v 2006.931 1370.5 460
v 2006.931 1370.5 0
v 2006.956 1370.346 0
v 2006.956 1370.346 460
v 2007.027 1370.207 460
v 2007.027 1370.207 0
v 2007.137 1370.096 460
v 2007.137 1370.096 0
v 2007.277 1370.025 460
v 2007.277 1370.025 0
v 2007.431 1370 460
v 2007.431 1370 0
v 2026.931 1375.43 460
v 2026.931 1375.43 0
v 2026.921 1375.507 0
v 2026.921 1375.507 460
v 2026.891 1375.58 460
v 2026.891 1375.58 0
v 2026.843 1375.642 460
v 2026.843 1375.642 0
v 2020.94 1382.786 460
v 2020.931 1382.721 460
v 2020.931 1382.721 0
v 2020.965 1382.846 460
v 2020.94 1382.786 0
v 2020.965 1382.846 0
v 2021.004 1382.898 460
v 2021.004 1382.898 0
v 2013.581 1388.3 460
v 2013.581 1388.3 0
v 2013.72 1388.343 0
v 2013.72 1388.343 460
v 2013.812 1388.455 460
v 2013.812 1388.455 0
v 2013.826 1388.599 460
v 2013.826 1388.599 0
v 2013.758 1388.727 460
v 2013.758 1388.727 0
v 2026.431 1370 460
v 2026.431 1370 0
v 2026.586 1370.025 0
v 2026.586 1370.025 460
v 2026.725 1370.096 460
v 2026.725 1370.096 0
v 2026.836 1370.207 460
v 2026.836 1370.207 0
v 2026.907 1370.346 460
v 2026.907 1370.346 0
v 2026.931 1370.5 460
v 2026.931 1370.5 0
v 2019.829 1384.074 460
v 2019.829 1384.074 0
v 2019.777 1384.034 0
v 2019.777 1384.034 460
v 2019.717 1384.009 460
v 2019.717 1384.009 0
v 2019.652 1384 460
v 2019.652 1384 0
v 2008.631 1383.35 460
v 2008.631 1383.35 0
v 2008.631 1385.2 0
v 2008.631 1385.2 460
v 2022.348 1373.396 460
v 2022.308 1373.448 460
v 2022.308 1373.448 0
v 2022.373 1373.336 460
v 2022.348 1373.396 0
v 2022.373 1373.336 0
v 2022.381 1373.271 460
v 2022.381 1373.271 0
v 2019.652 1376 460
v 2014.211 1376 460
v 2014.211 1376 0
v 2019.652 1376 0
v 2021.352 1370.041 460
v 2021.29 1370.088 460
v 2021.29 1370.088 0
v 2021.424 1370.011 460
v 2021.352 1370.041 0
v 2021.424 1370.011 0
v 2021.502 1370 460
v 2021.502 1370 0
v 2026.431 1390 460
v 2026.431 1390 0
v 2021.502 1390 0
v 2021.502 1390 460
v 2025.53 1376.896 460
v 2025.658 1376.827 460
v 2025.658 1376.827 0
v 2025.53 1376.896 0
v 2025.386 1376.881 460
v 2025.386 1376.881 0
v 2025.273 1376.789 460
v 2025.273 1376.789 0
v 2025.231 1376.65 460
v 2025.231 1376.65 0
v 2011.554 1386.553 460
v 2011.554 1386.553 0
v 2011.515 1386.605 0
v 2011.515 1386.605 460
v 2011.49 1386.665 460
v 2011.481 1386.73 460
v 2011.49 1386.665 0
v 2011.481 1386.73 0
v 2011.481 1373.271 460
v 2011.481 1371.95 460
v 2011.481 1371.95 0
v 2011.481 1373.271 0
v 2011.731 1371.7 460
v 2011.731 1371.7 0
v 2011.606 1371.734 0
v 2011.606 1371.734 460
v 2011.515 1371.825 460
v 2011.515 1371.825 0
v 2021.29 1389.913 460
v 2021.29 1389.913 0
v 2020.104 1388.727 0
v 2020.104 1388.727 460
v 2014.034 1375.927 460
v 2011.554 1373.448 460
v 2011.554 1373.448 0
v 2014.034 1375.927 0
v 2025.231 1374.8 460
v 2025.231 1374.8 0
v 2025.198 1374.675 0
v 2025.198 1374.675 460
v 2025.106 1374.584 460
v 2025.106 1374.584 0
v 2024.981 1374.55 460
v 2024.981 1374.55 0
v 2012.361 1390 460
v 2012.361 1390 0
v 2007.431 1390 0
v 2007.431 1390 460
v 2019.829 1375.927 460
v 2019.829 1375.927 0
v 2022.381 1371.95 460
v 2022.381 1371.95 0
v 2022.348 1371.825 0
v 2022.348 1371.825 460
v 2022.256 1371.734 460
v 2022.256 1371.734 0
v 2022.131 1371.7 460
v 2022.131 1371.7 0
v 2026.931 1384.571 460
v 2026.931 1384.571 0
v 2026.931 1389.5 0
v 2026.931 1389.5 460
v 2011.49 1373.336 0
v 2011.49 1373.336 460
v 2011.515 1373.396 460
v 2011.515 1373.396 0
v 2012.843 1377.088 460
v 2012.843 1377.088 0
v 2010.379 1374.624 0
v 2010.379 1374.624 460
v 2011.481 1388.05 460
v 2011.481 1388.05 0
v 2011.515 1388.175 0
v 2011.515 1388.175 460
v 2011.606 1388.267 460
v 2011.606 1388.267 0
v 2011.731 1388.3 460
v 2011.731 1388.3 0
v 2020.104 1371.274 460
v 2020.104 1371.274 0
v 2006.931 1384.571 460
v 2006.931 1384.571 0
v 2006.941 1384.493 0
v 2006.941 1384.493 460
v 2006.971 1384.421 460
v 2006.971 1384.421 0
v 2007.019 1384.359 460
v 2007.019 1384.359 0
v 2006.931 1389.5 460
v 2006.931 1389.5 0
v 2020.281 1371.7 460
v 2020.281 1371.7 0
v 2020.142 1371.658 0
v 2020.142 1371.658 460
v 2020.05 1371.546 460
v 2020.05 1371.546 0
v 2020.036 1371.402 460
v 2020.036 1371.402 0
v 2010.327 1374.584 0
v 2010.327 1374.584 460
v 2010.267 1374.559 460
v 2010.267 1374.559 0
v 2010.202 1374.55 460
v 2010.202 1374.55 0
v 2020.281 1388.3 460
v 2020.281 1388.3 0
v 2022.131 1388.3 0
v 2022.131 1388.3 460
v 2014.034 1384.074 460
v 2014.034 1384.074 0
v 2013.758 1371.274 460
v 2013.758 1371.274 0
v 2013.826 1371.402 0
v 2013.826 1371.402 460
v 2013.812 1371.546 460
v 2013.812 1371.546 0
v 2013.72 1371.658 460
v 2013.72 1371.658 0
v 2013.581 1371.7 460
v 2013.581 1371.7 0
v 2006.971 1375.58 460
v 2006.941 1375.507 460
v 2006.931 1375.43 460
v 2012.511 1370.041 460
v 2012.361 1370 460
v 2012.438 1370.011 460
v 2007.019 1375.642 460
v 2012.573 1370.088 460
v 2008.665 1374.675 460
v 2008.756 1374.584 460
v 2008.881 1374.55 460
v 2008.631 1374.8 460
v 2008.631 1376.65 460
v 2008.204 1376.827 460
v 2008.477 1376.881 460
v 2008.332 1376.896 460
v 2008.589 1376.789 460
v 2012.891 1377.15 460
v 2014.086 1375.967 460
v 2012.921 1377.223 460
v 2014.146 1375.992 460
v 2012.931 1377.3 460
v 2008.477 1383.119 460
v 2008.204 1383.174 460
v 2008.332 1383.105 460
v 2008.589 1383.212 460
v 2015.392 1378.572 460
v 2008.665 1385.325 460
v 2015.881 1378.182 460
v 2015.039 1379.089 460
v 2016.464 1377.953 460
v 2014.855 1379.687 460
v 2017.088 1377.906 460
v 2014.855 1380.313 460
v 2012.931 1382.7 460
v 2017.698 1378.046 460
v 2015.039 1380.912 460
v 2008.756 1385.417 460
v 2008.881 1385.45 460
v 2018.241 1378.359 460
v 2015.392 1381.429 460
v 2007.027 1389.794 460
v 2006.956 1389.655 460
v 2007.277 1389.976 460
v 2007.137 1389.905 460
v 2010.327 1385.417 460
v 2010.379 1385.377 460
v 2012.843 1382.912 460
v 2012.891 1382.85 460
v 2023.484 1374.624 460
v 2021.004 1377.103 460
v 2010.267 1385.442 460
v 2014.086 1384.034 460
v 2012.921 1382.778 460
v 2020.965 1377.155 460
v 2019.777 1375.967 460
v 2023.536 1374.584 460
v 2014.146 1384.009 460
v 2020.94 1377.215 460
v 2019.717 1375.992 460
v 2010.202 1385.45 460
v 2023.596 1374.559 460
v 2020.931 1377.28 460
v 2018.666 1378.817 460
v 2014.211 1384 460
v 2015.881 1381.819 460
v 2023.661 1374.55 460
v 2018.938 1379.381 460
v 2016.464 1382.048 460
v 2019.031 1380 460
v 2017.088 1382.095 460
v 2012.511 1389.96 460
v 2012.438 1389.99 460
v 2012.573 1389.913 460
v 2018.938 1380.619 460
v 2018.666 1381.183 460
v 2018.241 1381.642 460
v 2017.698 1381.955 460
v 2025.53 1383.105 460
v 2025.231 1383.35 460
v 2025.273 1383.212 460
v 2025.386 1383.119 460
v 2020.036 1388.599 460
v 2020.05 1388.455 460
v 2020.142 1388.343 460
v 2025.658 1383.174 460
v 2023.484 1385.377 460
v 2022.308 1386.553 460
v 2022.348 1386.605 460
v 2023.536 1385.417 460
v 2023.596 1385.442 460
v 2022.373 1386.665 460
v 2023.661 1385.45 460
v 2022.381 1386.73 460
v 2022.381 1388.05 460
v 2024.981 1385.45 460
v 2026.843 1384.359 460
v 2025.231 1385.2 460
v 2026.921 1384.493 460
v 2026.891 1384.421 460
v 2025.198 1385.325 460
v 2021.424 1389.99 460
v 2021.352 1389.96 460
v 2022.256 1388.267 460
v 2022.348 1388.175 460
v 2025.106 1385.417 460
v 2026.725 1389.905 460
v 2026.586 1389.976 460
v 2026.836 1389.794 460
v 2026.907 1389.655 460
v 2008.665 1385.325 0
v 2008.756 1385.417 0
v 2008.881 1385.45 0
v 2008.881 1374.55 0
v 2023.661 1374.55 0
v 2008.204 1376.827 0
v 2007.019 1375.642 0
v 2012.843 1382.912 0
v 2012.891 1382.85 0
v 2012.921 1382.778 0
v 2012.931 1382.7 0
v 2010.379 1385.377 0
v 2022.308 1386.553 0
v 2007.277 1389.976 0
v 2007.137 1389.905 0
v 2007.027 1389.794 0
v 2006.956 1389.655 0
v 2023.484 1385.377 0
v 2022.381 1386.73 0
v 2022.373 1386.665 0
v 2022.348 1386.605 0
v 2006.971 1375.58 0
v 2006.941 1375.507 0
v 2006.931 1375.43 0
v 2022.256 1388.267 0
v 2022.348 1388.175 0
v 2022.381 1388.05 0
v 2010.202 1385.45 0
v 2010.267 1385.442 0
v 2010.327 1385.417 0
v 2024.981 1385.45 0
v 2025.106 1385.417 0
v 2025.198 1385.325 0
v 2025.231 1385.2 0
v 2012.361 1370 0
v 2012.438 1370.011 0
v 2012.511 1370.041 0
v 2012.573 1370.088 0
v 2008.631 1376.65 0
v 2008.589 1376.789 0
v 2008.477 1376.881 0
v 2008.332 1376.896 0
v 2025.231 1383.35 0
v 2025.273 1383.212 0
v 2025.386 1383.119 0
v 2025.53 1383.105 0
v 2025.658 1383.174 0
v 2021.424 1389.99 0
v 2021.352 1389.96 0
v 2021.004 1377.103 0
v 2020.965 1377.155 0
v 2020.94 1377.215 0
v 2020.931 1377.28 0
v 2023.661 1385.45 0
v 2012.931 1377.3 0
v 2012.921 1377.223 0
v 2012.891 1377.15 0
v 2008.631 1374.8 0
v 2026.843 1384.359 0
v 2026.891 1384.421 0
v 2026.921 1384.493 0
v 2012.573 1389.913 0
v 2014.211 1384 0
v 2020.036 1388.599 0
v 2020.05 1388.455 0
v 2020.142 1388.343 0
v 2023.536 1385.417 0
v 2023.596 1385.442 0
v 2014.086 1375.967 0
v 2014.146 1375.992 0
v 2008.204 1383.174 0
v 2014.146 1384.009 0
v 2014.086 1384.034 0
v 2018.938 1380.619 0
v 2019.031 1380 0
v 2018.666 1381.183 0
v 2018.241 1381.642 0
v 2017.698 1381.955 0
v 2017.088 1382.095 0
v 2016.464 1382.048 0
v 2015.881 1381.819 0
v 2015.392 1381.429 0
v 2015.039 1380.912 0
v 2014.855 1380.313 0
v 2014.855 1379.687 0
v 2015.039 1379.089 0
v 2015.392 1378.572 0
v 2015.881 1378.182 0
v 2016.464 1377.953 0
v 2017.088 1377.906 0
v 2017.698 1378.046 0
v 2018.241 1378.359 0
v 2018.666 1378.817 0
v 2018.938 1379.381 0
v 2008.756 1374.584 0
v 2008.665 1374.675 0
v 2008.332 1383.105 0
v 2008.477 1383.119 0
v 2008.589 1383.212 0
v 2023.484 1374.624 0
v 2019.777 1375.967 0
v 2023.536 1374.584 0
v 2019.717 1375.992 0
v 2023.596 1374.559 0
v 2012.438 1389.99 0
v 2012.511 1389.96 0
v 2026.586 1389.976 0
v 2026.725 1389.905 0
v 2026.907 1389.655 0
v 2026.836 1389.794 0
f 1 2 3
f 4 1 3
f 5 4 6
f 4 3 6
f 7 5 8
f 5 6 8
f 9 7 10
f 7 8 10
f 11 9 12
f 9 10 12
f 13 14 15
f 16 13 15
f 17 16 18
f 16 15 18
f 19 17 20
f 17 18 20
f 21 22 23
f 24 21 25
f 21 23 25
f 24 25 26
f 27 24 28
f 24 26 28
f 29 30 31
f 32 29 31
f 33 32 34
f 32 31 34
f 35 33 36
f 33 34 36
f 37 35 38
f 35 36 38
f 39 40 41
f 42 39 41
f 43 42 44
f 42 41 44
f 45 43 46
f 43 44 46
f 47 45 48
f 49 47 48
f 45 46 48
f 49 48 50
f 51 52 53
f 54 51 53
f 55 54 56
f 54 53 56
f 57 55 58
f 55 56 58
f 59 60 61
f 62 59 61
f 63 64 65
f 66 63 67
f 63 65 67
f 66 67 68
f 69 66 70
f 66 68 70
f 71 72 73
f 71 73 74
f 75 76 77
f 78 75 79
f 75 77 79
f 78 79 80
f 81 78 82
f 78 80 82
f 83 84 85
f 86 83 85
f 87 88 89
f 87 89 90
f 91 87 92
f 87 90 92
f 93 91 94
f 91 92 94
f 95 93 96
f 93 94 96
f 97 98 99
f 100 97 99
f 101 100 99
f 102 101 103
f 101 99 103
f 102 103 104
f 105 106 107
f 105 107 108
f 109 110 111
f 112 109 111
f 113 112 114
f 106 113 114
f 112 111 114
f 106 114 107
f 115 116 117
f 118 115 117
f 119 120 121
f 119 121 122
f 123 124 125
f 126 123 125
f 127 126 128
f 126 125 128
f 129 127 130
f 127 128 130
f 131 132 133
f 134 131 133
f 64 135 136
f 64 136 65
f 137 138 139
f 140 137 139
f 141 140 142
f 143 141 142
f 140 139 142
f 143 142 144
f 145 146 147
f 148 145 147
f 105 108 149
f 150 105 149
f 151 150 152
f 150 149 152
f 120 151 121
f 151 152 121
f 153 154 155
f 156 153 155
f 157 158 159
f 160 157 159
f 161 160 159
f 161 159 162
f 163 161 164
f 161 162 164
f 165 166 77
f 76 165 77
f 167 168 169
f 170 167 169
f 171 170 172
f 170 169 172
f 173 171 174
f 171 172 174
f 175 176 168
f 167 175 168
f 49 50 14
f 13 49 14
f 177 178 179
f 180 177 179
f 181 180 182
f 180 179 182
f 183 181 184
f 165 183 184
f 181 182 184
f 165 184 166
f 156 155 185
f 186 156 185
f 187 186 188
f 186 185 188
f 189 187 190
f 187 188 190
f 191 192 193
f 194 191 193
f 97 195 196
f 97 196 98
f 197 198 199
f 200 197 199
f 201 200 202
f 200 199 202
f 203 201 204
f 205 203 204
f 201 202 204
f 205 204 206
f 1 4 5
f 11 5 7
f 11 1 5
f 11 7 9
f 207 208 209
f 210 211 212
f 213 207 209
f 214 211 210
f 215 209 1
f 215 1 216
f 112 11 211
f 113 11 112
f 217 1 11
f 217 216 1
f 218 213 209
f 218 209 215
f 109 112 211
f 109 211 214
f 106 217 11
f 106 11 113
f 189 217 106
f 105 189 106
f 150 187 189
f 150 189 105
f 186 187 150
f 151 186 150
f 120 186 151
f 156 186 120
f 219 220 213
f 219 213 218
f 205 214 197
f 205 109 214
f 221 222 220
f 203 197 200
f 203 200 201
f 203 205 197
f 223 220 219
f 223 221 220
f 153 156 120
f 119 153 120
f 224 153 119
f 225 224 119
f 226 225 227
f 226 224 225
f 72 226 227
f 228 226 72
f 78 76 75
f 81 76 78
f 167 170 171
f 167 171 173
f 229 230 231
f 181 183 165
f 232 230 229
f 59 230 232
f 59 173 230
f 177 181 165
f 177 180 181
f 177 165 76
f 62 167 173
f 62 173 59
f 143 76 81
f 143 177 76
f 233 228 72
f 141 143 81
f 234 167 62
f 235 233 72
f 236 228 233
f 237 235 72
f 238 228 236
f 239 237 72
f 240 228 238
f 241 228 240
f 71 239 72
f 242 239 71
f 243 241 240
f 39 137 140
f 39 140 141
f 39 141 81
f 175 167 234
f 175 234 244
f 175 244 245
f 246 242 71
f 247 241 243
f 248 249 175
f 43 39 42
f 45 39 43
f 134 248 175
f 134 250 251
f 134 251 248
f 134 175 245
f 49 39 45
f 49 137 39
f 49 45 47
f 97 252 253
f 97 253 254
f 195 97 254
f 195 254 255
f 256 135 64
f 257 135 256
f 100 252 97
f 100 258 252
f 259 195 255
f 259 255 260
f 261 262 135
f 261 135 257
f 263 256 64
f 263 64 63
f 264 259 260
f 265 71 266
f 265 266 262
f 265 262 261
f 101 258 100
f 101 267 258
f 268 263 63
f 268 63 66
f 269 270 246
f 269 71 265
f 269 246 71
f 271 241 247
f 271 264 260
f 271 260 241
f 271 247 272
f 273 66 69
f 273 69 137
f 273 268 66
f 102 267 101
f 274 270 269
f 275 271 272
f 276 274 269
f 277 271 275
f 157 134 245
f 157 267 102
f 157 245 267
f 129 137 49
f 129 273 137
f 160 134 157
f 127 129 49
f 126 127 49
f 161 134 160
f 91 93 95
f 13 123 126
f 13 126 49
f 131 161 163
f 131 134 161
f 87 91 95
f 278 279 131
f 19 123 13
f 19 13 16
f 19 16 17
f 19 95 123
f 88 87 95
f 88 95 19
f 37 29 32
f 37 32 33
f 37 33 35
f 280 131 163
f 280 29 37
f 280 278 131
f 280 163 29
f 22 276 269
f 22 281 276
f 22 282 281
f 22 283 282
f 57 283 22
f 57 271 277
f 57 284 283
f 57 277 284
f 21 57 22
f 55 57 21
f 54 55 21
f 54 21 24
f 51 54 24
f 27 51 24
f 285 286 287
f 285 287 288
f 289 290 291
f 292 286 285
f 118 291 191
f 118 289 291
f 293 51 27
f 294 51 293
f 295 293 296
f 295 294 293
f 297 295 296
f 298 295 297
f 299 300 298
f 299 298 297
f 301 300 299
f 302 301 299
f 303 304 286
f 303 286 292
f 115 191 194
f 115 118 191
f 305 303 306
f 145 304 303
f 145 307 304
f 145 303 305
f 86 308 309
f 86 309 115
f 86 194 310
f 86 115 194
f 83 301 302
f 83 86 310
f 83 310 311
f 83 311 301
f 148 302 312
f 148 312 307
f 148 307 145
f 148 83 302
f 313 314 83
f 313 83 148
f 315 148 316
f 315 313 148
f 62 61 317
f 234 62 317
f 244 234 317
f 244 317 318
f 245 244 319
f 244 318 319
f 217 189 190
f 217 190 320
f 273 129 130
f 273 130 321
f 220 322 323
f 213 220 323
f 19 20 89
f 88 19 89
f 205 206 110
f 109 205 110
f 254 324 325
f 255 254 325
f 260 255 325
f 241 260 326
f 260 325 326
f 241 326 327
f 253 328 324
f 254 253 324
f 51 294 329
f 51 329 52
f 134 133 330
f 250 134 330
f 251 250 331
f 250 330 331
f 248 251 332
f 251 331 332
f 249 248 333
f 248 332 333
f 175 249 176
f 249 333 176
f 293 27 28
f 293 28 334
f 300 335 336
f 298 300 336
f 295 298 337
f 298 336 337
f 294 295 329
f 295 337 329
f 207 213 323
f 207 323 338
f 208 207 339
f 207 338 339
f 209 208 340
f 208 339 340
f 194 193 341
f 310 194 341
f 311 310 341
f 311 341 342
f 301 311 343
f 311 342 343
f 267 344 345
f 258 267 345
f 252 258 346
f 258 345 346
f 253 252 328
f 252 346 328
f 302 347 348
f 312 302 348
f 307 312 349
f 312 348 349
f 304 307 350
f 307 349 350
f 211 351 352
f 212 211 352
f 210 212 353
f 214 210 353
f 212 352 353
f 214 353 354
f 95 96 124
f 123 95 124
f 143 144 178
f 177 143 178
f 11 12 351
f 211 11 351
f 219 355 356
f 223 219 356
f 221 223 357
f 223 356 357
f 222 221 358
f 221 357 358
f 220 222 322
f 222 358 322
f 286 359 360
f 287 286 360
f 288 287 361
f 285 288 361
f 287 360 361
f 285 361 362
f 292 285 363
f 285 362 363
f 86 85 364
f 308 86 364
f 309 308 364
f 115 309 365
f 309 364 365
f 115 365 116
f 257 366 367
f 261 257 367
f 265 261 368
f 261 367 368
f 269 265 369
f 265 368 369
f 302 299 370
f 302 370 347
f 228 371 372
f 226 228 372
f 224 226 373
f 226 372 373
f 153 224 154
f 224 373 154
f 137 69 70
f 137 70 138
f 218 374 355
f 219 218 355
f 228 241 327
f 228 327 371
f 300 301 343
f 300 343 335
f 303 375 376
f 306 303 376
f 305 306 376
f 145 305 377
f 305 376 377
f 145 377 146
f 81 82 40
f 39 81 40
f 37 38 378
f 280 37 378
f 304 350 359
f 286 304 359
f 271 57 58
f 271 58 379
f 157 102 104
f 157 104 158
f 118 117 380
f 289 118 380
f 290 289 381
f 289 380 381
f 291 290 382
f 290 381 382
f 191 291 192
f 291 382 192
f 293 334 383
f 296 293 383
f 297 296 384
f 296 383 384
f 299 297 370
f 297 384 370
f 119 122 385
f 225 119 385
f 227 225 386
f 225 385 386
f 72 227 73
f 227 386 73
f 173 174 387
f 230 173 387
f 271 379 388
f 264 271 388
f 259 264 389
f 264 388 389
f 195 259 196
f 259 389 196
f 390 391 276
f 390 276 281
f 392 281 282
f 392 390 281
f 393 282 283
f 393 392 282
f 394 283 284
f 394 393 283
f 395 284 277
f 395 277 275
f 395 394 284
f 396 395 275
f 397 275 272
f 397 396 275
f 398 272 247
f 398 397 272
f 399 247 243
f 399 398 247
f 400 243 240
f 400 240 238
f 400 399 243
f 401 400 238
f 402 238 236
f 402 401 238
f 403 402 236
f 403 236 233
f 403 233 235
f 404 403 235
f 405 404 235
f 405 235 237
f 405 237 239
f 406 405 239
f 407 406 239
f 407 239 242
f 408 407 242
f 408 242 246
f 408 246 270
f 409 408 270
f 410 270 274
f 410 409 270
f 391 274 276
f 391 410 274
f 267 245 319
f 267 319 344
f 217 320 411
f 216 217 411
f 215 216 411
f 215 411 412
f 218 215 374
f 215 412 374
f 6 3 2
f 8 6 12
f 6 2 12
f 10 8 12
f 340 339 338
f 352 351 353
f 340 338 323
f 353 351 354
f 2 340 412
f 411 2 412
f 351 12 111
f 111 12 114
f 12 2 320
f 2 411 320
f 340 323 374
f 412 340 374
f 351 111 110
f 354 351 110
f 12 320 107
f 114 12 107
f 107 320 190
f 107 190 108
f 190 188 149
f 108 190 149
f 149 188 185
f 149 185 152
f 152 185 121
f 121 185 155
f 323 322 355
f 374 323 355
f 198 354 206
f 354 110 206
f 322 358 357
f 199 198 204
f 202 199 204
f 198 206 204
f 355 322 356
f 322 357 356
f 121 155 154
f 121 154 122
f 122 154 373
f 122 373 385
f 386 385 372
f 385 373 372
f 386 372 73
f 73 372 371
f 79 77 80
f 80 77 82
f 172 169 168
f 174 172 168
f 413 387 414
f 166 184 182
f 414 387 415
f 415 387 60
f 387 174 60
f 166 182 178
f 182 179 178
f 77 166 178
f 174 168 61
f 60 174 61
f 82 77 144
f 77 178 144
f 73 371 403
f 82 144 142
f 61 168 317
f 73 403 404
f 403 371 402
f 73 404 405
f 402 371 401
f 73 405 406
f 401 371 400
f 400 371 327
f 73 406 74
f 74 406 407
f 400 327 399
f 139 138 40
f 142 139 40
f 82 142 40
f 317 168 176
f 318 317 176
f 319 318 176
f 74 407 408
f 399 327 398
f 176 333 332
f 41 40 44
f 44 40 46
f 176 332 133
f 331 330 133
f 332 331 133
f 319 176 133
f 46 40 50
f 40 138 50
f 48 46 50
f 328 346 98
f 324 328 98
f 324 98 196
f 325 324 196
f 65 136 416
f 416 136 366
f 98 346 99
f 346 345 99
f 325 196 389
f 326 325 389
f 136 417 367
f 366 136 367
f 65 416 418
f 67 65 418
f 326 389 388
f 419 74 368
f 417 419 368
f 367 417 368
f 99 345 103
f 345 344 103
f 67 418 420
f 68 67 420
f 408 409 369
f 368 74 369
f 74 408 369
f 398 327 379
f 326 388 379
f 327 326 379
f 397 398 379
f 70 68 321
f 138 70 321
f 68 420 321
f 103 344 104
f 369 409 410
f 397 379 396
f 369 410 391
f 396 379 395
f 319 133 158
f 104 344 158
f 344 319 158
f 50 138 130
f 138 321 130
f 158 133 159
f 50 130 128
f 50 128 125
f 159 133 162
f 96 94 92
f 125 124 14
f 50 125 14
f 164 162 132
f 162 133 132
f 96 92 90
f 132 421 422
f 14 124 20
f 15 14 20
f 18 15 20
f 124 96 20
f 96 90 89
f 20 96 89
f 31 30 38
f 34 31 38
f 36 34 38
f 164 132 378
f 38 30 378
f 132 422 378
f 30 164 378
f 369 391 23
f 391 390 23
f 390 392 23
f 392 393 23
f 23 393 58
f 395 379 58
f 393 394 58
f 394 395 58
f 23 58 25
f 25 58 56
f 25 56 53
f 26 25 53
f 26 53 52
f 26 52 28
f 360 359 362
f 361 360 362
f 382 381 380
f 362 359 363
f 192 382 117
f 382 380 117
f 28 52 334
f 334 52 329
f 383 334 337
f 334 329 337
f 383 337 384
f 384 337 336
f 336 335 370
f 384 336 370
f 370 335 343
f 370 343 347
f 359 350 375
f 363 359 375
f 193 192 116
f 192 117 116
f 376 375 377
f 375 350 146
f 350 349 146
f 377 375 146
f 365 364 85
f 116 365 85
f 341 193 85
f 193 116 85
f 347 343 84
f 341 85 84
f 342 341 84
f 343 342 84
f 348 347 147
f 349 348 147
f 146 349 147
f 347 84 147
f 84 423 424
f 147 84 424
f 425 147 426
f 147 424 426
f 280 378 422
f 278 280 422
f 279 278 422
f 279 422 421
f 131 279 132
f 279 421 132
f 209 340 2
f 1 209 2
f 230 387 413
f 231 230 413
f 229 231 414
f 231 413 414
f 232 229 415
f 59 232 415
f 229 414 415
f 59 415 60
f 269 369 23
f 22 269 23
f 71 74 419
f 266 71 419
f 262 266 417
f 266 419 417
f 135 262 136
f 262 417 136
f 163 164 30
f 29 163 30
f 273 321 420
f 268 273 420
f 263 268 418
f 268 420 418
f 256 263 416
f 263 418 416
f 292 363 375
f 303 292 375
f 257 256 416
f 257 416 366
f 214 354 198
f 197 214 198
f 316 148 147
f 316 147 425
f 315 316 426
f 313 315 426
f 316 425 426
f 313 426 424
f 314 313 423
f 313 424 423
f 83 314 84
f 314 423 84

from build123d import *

# Parameters (mm, degrees)
MODEL_R             = 2.1
BOSS_EXTRUDE1_DEPTH = 460


with BuildPart() as part:
    # Model → Boss-Extrude1 (new body)
    with BuildSketch(Plane.XY):
        with BuildLine():
            Line((2012.931211125, 1381.800393717), (2012.931211125, 1378.200393717))
            Line((2012.931211125, 1378.200393717), (2012.931211125, 1377.300429431))
            ThreePointArc((2012.931211125, 1377.300429431), (2012.908374985, 1377.185624401), (2012.843343159, 1377.088297396))
            Line((2012.843343159, 1377.088297396), (2010.378662785, 1374.623617022))
            ThreePointArc((2010.378662785, 1374.623617022), (2010.297556948, 1374.569423834), (2010.20188609, 1374.550393717))
            Line((2010.20188609, 1374.550393717), (2008.881211125, 1374.550393717))
            ThreePointArc((2008.881211125, 1374.550393717), (2008.70443443, 1374.623617022), (2008.631211125, 1374.800393717))
            Line((2008.631211125, 1374.800393717), (2008.631211125, 1376.650393717))
            ThreePointArc((2008.631211125, 1376.650393717), (2008.476881983, 1376.8813636), (2008.20443443, 1376.827170412))
            Line((2008.20443443, 1376.827170412), (2007.01907909, 1375.641815073))
            ThreePointArc((2007.01907909, 1375.641815073), (2006.954047265, 1375.544488069), (2006.931211125, 1375.429683039))
            Line((2006.931211125, 1375.429683039), (2006.931211125, 1370.500393717))
            ThreePointArc((2006.931211125, 1370.500393717), (2007.077657734, 1370.146840327), (2007.431211125, 1370.000393717))
            Line((2007.431211125, 1370.000393717), (2012.360500447, 1370.000393717))
            ThreePointArc((2012.360500447, 1370.000393717), (2012.475305476, 1370.023229857), (2012.572632481, 1370.088261683))
            Line((2012.572632481, 1370.088261683), (2013.75798782, 1371.273617022))
            ThreePointArc((2013.75798782, 1371.273617022), (2013.812181008, 1371.546064575), (2013.581211125, 1371.700393717))
            Line((2013.581211125, 1371.700393717), (2011.731211125, 1371.700393717))
            ThreePointArc((2011.731211125, 1371.700393717), (2011.55443443, 1371.773617022), (2011.481211125, 1371.950393717))
            Line((2011.481211125, 1371.950393717), (2011.481211125, 1373.271068682))
            ThreePointArc((2011.481211125, 1373.271068682), (2011.500241242, 1373.36673954), (2011.55443443, 1373.447845377))
            Line((2011.55443443, 1373.447845377), (2014.033759465, 1375.927170412))
            ThreePointArc((2014.033759465, 1375.927170412), (2014.114865302, 1375.9813636), (2014.21053616, 1376.000393717))
            Line((2014.21053616, 1376.000393717), (2016.470233902, 1376.000393717))
            Line((2016.470233902, 1376.000393717), (2017.392188348, 1376.000393717))
            Line((2017.392188348, 1376.000393717), (2019.65188609, 1376.000393717))
            ThreePointArc((2019.65188609, 1376.000393717), (2019.747556948, 1375.9813636), (2019.828662785, 1375.927170412))
            Line((2019.828662785, 1375.927170412), (2022.30798782, 1373.447845377))
            ThreePointArc((2022.30798782, 1373.447845377), (2022.362181008, 1373.36673954), (2022.381211125, 1373.271068682))
            Line((2022.381211125, 1373.271068682), (2022.381211125, 1371.950393717))
            ThreePointArc((2022.381211125, 1371.950393717), (2022.30798782, 1371.773617022), (2022.131211125, 1371.700393717))
            Line((2022.131211125, 1371.700393717), (2020.281211125, 1371.700393717))
            ThreePointArc((2020.281211125, 1371.700393717), (2020.050241242, 1371.546064575), (2020.10443443, 1371.273617022))
            Line((2020.10443443, 1371.273617022), (2021.289789769, 1370.088261683))
            ThreePointArc((2021.289789769, 1370.088261683), (2021.387116773, 1370.023229857), (2021.501921803, 1370.000393717))
            Line((2021.501921803, 1370.000393717), (2026.431211125, 1370.000393717))
            ThreePointArc((2026.431211125, 1370.000393717), (2026.784764515, 1370.146840327), (2026.931211125, 1370.500393717))
            Line((2026.931211125, 1370.500393717), (2026.931211125, 1375.429683039))
            ThreePointArc((2026.931211125, 1375.429683039), (2026.908374985, 1375.544488069), (2026.843343159, 1375.641815073))
            Line((2026.843343159, 1375.641815073), (2025.65798782, 1376.827170412))
            ThreePointArc((2025.65798782, 1376.827170412), (2025.385540267, 1376.8813636), (2025.231211125, 1376.650393717))
            Line((2025.231211125, 1376.650393717), (2025.231211125, 1374.800393717))
            ThreePointArc((2025.231211125, 1374.800393717), (2025.15798782, 1374.623617022), (2024.981211125, 1374.550393717))
            Line((2024.981211125, 1374.550393717), (2023.66053616, 1374.550393717))
            ThreePointArc((2023.66053616, 1374.550393717), (2023.564865302, 1374.569423834), (2023.483759465, 1374.623617022))
            Line((2023.483759465, 1374.623617022), (2021.00443443, 1377.102942057))
            ThreePointArc((2021.00443443, 1377.102942057), (2020.950241242, 1377.184047894), (2020.931211125, 1377.279718752))
            Line((2020.931211125, 1377.279718752), (2020.931211125, 1379.539416494))
            Line((2020.931211125, 1379.539416494), (2020.931211125, 1380.46137094))
            Line((2020.931211125, 1380.46137094), (2020.931211125, 1382.721068682))
            ThreePointArc((2020.931211125, 1382.721068682), (2020.950241242, 1382.81673954), (2021.00443443, 1382.897845377))
            Line((2021.00443443, 1382.897845377), (2023.483759465, 1385.377170412))
            ThreePointArc((2023.483759465, 1385.377170412), (2023.564865302, 1385.4313636), (2023.66053616, 1385.450393717))
            Line((2023.66053616, 1385.450393717), (2024.981211125, 1385.450393717))
            ThreePointArc((2024.981211125, 1385.450393717), (2025.15798782, 1385.377170412), (2025.231211125, 1385.200393717))
            Line((2025.231211125, 1385.200393717), (2025.231211125, 1383.350393717))
            ThreePointArc((2025.231211125, 1383.350393717), (2025.385540267, 1383.119423834), (2025.65798782, 1383.173617022))
            Line((2025.65798782, 1383.173617022), (2026.843343159, 1384.358972361))
            ThreePointArc((2026.843343159, 1384.358972361), (2026.908374985, 1384.456299366), (2026.931211125, 1384.571104395))
            Line((2026.931211125, 1384.571104395), (2026.931211125, 1389.500393717))
            ThreePointArc((2026.931211125, 1389.500393717), (2026.784764516, 1389.853947108), (2026.431211125, 1390.000393717))
            Line((2026.431211125, 1390.000393717), (2021.501921803, 1390.000393717))
            ThreePointArc((2021.501921803, 1390.000393717), (2021.387116773, 1389.977557577), (2021.289789769, 1389.912525752))
            Line((2021.289789769, 1389.912525752), (2020.10443443, 1388.727170413))
            ThreePointArc((2020.10443443, 1388.727170413), (2020.050241242, 1388.454722859), (2020.281211125, 1388.300393717))
            Line((2020.281211125, 1388.300393717), (2022.131211125, 1388.300393717))
            ThreePointArc((2022.131211125, 1388.300393717), (2022.30798782, 1388.227170413), (2022.381211125, 1388.050393717))
            Line((2022.381211125, 1388.050393717), (2022.381211125, 1386.729718752))
            ThreePointArc((2022.381211125, 1386.729718752), (2022.362181008, 1386.634047894), (2022.30798782, 1386.552942057))
            Line((2022.30798782, 1386.552942057), (2019.828662785, 1384.073617022))
            ThreePointArc((2019.828662785, 1384.073617022), (2019.747556948, 1384.019423834), (2019.65188609, 1384.000393717))
            Line((2019.65188609, 1384.000393717), (2017.392188348, 1384.000393717))
            Line((2017.392188348, 1384.000393717), (2016.470233902, 1384.000393717))
            Line((2016.470233902, 1384.000393717), (2014.21053616, 1384.000393717))
            ThreePointArc((2014.21053616, 1384.000393717), (2014.114865302, 1384.019423834), (2014.033759465, 1384.073617022))
            Line((2014.033759465, 1384.073617022), (2011.55443443, 1386.552942057))
            ThreePointArc((2011.55443443, 1386.552942057), (2011.500241242, 1386.634047894), (2011.481211125, 1386.729718752))
            Line((2011.481211125, 1386.729718752), (2011.481211125, 1388.050393717))
            ThreePointArc((2011.481211125, 1388.050393717), (2011.55443443, 1388.227170413), (2011.731211125, 1388.300393717))
            Line((2011.731211125, 1388.300393717), (2013.581211125, 1388.300393717))
            ThreePointArc((2013.581211125, 1388.300393717), (2013.812181008, 1388.454722859), (2013.75798782, 1388.727170413))
            Line((2013.75798782, 1388.727170413), (2012.572632481, 1389.912525752))
            ThreePointArc((2012.572632481, 1389.912525752), (2012.475305477, 1389.977557577), (2012.360500447, 1390.000393717))
            Line((2012.360500447, 1390.000393717), (2007.431211125, 1390.000393717))
            ThreePointArc((2007.431211125, 1390.000393717), (2007.077657734, 1389.853947108), (2006.931211125, 1389.500393717))
            Line((2006.931211125, 1389.500393717), (2006.931211125, 1384.571104395))
            ThreePointArc((2006.931211125, 1384.571104395), (2006.954047265, 1384.456299366), (2007.019079091, 1384.358972361))
            Line((2007.019079091, 1384.358972361), (2008.20443443, 1383.173617022))
            ThreePointArc((2008.20443443, 1383.173617022), (2008.476881983, 1383.119423834), (2008.631211125, 1383.350393717))
            Line((2008.631211125, 1383.350393717), (2008.631211125, 1385.200393717))
            ThreePointArc((2008.631211125, 1385.200393717), (2008.70443443, 1385.377170412), (2008.881211125, 1385.450393717))
            Line((2008.881211125, 1385.450393717), (2010.20188609, 1385.450393717))
            ThreePointArc((2010.20188609, 1385.450393717), (2010.297556948, 1385.4313636), (2010.378662785, 1385.377170412))
            Line((2010.378662785, 1385.377170412), (2012.843343159, 1382.912490038))
            ThreePointArc((2012.843343159, 1382.912490038), (2012.908374985, 1382.815163033), (2012.931211125, 1382.700358004))
            Line((2012.931211125, 1382.700358004), (2012.931211125, 1381.800393717))
        make_face()
        with Locations((2016.931211125, 1380.000393717)):
            Circle(MODEL_R, mode=Mode.SUBTRACT)
    extrude(amount=BOSS_EXTRUDE1_DEPTH)


solid = part.part
